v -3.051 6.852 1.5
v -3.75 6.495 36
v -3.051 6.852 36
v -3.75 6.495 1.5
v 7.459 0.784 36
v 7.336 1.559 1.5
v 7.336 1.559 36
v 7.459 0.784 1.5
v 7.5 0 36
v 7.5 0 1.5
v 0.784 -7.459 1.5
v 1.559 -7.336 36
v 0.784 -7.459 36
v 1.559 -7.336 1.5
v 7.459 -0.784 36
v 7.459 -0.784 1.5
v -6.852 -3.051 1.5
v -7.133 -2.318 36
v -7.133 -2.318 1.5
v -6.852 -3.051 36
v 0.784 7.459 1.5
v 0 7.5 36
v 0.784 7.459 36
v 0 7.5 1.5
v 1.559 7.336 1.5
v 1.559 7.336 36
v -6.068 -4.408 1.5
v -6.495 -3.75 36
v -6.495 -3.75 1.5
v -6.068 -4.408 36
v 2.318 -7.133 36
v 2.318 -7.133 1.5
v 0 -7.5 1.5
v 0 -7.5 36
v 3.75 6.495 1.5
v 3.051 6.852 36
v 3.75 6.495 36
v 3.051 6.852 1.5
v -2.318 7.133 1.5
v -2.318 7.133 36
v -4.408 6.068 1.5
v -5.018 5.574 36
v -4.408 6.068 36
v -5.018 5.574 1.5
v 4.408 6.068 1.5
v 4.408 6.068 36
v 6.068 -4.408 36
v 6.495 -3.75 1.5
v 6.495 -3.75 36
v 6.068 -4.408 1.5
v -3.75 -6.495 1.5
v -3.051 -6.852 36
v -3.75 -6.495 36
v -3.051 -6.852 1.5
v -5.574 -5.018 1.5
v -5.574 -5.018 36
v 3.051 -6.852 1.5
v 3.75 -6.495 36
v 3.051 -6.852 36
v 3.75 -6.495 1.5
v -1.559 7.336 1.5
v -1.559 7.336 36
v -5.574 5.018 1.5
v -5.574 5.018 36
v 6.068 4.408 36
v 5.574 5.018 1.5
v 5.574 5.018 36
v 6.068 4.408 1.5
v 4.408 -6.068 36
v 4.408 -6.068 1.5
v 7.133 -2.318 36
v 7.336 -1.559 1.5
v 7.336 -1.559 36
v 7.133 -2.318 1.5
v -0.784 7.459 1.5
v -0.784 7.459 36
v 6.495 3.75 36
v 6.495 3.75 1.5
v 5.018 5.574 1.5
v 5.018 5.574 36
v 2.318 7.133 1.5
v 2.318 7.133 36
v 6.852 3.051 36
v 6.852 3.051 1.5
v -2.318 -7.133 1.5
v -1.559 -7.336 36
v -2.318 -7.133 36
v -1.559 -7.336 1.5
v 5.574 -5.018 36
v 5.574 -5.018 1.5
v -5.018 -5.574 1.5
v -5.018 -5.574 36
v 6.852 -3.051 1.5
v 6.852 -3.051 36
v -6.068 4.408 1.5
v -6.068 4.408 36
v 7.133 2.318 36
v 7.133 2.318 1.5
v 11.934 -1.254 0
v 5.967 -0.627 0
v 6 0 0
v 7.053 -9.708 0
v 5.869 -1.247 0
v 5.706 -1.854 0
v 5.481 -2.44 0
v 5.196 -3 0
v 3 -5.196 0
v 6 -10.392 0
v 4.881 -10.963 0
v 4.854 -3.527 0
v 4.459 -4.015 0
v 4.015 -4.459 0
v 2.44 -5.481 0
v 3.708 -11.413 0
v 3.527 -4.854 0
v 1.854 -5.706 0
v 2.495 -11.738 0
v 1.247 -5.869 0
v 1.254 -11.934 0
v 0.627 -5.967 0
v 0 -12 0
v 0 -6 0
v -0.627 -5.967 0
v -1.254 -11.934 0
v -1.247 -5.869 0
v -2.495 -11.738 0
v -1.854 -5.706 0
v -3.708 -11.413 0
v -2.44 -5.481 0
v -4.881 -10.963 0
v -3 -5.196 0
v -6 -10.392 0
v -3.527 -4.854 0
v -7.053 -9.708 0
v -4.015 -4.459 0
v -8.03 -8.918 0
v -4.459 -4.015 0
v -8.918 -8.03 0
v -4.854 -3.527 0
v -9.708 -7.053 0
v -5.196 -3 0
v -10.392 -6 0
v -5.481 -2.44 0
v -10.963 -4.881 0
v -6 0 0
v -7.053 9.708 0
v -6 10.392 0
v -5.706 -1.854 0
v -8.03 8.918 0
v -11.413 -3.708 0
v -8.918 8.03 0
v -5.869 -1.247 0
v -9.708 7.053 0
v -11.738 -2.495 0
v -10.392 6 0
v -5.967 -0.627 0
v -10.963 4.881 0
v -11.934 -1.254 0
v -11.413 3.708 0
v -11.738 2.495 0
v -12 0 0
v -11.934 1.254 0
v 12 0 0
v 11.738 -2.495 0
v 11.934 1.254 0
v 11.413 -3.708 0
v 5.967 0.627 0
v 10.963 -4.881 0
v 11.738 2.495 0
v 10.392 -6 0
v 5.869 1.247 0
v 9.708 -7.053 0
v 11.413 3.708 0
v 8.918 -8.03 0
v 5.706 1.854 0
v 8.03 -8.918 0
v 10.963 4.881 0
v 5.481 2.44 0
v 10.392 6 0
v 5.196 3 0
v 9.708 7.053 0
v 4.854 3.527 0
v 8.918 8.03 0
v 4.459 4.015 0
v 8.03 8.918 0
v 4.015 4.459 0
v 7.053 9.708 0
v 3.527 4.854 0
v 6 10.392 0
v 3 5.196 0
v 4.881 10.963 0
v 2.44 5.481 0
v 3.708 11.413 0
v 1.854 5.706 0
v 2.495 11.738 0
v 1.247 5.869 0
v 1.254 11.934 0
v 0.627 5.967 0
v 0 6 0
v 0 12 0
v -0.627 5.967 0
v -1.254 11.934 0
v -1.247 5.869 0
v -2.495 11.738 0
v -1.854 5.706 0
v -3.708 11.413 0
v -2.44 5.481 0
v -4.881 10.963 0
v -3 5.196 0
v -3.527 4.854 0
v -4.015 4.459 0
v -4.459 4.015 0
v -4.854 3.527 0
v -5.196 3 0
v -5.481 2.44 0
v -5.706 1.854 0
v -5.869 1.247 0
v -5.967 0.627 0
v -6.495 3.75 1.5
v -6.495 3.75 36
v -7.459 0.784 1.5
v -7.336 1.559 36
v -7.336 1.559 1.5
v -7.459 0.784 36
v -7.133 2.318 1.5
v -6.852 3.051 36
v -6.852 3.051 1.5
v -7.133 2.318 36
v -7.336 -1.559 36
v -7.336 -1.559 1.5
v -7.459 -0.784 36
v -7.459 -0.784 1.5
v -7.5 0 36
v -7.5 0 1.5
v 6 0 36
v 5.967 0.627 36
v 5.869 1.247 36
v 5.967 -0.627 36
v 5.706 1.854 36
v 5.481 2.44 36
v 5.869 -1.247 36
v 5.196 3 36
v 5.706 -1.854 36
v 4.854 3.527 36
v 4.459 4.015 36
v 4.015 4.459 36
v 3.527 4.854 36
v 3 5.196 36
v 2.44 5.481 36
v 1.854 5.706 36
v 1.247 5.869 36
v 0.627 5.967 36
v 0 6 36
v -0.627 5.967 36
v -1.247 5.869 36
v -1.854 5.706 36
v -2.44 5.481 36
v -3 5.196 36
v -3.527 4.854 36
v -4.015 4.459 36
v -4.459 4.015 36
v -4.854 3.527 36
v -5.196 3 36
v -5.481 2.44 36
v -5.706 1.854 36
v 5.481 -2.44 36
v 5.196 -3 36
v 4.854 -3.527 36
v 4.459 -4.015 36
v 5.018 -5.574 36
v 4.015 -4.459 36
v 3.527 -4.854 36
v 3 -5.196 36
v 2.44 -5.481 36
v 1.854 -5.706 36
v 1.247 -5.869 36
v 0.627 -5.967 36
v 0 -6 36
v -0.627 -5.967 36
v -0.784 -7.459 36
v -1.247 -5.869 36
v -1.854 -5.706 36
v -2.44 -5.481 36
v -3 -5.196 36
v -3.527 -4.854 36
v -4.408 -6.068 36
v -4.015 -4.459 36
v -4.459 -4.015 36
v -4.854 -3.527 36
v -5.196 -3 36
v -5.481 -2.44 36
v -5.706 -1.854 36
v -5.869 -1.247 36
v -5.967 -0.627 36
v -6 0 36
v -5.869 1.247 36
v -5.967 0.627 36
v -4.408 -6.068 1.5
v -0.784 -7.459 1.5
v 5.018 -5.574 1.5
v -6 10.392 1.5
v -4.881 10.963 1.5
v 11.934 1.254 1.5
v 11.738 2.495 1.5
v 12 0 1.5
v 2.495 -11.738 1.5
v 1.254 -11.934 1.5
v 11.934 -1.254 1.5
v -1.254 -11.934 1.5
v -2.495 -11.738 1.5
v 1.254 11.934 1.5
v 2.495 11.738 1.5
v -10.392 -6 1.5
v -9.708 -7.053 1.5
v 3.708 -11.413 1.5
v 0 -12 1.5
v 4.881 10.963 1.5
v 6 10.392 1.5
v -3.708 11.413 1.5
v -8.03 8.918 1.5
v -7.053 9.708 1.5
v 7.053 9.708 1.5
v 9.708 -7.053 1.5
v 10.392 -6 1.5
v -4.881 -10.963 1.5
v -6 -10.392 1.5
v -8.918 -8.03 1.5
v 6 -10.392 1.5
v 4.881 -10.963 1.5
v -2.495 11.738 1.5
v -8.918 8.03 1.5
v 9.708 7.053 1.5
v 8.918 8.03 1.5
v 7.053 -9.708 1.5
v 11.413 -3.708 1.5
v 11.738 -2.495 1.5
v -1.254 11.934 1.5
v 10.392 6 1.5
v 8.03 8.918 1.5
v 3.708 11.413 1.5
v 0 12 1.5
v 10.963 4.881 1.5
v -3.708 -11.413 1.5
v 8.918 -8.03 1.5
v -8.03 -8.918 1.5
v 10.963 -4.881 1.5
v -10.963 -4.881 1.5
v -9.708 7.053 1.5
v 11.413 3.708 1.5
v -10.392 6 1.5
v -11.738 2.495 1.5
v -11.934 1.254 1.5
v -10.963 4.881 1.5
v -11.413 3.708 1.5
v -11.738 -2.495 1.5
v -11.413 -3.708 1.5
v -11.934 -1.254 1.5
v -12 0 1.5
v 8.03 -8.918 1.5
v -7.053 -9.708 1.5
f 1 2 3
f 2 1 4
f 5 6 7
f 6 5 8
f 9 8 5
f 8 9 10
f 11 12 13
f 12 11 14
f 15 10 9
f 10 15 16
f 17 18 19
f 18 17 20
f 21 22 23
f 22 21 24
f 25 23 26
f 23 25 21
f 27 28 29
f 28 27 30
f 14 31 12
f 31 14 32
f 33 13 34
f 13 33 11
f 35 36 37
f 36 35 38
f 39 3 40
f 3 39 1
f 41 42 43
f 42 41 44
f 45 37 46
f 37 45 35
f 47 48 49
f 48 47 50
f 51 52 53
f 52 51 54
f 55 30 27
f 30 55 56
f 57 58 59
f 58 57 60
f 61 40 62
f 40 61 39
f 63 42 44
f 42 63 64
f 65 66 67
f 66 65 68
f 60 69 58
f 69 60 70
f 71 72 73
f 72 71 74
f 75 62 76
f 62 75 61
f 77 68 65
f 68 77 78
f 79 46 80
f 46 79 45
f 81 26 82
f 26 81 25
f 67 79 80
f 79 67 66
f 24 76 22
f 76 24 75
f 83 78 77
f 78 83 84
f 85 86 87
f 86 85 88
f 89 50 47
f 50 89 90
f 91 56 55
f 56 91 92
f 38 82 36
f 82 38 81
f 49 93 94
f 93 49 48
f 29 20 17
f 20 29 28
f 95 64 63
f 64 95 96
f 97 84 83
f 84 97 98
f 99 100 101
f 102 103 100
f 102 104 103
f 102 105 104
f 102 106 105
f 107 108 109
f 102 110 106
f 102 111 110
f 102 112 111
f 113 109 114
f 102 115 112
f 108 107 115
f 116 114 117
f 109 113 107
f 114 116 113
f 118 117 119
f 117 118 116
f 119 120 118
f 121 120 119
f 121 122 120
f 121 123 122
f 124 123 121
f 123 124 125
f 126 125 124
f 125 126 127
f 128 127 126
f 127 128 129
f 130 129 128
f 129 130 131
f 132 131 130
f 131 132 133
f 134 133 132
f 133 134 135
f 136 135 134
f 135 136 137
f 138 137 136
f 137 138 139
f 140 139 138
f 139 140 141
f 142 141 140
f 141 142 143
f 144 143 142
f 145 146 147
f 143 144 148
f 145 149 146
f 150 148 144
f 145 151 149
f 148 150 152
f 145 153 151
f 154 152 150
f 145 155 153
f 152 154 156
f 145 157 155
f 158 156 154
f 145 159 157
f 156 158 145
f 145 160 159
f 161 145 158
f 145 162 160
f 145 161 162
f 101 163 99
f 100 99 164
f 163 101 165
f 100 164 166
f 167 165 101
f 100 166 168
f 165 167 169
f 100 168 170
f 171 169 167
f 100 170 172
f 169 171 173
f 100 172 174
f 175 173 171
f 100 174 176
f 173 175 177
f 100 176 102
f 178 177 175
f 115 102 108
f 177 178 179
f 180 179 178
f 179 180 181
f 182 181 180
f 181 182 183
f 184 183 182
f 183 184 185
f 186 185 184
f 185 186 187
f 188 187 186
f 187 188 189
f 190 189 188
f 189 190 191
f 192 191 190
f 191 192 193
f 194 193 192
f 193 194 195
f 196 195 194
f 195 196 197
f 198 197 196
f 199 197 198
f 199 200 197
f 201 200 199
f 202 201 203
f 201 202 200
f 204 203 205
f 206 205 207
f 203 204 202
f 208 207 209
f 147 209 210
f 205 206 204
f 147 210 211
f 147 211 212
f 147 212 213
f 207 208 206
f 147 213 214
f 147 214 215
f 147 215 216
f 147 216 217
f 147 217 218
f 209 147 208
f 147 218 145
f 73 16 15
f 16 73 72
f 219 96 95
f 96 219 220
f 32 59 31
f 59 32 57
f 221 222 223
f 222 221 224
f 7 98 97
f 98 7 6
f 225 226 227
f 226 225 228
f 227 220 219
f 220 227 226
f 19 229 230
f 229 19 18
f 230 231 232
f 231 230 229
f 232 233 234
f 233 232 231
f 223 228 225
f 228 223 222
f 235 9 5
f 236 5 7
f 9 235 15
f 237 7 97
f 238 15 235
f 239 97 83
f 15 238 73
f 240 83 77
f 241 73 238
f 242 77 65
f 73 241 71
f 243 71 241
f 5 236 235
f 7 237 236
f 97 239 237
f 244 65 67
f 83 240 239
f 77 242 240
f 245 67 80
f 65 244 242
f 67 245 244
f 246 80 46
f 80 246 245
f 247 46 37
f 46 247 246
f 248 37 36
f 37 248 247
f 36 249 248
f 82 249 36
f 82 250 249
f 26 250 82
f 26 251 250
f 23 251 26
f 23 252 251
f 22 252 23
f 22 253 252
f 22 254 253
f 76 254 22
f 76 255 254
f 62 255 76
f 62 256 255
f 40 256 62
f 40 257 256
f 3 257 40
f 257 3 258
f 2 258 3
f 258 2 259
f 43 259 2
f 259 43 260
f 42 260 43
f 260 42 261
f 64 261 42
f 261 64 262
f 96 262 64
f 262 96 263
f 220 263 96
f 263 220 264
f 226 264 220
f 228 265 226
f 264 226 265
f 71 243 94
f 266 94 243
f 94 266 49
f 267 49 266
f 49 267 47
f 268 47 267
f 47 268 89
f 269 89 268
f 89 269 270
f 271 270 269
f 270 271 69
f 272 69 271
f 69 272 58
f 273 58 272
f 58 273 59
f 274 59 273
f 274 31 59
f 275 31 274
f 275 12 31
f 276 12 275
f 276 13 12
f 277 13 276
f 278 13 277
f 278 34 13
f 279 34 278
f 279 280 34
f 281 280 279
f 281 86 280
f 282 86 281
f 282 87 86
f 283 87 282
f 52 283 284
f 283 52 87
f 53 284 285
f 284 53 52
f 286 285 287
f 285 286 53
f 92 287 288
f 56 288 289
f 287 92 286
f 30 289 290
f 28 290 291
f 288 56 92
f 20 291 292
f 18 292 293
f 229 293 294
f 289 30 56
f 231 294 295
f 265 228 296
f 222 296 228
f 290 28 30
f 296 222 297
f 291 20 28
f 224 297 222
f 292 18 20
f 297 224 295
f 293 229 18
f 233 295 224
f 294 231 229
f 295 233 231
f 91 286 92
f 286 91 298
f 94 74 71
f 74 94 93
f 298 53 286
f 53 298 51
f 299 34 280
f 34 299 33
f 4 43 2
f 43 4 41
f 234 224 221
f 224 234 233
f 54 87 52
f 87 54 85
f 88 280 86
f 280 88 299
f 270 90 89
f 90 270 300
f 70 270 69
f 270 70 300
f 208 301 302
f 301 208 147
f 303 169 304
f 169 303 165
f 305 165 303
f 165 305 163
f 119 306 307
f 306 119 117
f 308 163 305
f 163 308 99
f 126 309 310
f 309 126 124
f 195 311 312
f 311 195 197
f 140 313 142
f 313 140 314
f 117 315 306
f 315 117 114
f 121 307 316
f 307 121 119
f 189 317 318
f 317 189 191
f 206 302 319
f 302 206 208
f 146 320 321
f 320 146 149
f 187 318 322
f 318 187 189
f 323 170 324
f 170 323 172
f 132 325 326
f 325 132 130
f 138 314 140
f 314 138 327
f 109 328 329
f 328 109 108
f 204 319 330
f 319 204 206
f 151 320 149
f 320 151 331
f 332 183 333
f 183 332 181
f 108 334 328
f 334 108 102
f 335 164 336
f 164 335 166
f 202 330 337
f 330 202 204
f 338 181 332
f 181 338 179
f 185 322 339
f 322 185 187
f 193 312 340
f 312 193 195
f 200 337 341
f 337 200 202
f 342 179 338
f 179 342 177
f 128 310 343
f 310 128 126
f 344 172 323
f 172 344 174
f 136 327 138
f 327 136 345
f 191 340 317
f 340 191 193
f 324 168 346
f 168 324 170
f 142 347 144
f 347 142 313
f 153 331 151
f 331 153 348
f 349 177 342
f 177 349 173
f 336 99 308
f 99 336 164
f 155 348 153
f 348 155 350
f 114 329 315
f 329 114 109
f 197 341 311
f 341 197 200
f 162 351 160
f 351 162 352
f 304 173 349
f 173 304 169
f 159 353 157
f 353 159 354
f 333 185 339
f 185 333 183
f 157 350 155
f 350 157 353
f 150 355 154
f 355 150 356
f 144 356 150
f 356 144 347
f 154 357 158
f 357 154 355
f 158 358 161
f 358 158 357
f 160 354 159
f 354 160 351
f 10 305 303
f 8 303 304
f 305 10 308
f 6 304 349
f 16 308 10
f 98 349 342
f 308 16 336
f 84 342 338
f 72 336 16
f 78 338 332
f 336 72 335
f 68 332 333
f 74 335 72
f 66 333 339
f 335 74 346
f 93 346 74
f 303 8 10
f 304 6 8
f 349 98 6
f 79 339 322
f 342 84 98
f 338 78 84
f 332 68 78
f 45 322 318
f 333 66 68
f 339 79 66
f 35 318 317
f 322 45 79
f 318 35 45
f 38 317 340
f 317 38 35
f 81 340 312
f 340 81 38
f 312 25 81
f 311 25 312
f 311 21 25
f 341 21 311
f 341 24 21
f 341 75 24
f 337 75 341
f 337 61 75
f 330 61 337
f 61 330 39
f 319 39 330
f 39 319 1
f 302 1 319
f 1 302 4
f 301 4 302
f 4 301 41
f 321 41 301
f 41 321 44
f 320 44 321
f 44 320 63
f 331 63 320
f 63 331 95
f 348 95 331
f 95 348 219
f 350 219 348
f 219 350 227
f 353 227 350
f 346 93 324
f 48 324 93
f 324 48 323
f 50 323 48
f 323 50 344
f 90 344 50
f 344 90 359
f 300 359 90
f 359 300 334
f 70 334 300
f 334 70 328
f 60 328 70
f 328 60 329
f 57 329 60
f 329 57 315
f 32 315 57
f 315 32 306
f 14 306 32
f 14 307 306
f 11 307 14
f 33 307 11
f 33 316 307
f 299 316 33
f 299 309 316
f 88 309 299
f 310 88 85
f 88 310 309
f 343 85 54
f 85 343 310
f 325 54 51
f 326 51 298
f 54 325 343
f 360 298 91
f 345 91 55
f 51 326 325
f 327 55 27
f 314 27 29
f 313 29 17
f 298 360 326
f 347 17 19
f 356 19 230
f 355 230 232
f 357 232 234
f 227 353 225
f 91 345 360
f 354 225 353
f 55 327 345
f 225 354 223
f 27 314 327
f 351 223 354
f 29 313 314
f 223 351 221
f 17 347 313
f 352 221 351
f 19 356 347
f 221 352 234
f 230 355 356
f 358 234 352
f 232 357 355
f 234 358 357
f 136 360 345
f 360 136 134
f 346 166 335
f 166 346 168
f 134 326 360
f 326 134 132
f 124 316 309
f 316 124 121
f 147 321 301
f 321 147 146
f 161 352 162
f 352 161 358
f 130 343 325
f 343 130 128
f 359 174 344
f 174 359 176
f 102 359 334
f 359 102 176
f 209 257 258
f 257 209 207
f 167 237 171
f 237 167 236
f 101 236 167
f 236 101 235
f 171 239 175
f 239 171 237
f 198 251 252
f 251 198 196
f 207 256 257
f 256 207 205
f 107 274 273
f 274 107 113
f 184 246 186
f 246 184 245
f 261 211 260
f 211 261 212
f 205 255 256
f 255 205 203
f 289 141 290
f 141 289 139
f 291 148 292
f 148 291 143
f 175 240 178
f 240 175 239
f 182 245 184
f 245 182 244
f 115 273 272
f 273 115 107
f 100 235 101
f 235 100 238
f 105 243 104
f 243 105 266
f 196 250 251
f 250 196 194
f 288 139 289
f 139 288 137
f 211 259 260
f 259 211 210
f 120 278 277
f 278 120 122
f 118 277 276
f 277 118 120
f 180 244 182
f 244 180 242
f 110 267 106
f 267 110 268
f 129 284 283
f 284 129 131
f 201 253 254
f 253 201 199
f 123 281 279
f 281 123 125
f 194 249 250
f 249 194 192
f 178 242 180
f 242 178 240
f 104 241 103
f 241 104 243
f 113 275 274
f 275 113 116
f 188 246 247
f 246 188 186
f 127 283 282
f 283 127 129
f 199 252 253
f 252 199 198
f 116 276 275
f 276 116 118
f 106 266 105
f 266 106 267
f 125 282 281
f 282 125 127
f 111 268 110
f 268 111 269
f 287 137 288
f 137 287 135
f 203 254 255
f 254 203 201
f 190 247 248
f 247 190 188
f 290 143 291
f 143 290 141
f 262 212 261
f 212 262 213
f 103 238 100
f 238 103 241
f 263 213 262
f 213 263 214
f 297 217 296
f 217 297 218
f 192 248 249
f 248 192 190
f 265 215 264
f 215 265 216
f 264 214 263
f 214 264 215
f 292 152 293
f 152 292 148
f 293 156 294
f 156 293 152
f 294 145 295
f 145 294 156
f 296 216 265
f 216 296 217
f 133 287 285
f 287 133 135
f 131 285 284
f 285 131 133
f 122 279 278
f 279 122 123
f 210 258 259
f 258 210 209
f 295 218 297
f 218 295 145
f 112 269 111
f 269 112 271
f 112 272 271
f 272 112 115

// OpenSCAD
// Blind-rivet body.
$fn = 60;
eps = 0.02;
shank_d = 12;
head_d = 24;
length = 36;
difference() { union() { cylinder(d=shank_d+3,h=length); cylinder(d=max(head_d, shank_d+5),h=1.5); } translate([0,0,-eps]) cylinder(d=shank_d,h=length+2*eps); }
